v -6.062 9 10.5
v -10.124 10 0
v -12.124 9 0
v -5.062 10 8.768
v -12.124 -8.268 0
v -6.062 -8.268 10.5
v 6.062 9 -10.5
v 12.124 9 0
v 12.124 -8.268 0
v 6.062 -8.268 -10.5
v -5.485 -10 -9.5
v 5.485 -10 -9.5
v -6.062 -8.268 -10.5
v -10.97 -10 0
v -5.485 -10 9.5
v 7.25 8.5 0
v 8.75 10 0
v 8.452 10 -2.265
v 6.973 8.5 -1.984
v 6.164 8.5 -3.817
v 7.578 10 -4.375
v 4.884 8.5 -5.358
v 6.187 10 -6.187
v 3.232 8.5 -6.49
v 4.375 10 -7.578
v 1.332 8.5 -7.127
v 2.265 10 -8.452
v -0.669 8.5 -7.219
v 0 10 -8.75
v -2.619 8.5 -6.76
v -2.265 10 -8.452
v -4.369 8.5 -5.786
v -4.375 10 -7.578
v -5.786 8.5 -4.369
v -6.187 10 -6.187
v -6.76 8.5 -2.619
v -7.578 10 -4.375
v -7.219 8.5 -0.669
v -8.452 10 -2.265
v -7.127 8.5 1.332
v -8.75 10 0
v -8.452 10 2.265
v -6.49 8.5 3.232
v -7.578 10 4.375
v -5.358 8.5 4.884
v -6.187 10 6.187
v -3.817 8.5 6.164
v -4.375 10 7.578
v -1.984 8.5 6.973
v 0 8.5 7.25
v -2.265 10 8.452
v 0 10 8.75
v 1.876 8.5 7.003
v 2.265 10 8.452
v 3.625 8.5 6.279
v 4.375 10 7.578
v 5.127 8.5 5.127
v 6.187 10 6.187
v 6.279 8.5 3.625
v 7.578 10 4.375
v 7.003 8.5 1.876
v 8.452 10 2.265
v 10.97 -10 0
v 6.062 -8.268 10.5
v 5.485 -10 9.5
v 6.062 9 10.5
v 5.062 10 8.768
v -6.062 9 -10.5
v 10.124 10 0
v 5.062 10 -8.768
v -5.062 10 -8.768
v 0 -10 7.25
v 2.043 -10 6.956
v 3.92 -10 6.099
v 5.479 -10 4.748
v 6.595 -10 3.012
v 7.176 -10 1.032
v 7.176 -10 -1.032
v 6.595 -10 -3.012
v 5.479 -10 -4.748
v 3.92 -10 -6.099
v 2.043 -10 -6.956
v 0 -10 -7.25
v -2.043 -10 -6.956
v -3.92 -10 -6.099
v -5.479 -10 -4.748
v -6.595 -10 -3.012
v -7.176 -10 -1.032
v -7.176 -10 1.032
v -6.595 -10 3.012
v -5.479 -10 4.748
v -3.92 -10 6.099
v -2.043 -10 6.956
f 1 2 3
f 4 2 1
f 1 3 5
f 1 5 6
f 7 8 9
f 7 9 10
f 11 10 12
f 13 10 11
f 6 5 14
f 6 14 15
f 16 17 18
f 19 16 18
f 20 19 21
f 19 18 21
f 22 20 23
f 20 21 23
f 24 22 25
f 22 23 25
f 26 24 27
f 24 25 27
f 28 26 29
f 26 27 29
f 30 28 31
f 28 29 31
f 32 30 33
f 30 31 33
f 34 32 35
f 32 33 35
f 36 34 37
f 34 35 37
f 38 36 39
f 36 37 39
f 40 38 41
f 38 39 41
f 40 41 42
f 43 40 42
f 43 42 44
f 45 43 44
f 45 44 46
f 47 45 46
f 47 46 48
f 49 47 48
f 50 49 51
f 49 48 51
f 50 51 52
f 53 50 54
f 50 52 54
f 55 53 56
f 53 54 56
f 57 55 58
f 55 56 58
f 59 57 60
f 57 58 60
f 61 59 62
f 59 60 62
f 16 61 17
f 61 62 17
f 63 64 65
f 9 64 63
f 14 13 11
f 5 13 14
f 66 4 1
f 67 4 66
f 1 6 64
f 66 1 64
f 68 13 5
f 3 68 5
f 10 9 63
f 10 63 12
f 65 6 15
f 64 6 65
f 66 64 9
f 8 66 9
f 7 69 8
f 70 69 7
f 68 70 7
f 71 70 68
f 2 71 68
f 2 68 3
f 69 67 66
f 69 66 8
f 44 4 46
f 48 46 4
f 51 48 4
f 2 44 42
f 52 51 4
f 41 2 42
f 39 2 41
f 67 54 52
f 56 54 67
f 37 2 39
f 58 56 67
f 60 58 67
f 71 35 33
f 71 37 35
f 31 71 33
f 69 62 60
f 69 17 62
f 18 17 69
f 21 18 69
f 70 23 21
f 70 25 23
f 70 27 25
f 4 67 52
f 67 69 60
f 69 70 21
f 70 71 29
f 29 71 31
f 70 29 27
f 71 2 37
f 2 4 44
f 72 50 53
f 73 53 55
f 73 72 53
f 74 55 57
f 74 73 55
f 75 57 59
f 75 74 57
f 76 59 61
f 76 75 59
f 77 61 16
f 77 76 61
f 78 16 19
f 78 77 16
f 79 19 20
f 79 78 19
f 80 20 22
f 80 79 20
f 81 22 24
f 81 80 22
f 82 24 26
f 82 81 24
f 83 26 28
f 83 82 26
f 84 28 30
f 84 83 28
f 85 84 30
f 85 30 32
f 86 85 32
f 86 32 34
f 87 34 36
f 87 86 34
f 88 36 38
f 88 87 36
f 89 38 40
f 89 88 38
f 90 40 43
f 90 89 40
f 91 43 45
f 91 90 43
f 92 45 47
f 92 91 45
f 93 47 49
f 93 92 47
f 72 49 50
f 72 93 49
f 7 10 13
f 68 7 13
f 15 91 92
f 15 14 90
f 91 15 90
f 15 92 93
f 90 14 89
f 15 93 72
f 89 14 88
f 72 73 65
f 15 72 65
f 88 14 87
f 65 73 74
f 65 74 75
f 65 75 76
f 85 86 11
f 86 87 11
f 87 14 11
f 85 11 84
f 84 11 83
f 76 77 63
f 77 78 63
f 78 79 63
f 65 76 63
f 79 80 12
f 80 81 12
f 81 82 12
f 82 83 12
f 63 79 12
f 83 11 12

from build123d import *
from OCP.BRepFilletAPI import BRepFilletAPI_MakeChamfer

# Parameters (mm, degrees)
SKETCH1_R           = 7.25
BOSS_EXTRUDE1_DEPTH = 10
CHAMFER2_SIZE       = 1
CHAMFER2_SIZE2      = 1.732050808


with BuildPart() as part:
    # Sketch1 → Boss-Extrude1 (new, symmetric)
    with BuildSketch(Plane(origin=(0, 0, 0), x_dir=(1, 0, 0), z_dir=(0, 1, 0))):
        Polygon((-12.124355653, 0), (-6.062177826, -10.5), (6.062177826, -10.5), (12.124355653, 0), (6.062177826, 10.5), (-6.062177826, 10.5), align=None)
        with Locations(Location((0, 0, 0), (0, 0, 270))):
            Circle(SKETCH1_R, mode=Mode.SUBTRACT)
    extrude(amount=BOSS_EXTRUDE1_DEPTH, both=True)

    # Chamfer1: read off the stored shape, not the designer's step
    # Chamfer1 outline → Chamfer1 (revolve, cut)
    with BuildSketch(Plane.XY):
        Polygon((7.25, 10), (7.25, 8.5), (8.75, 10), align=None)
    revolve(axis=Axis((0, 0, 0), (0, 1, 0)), mode=Mode.SUBTRACT)

    # Chamfer2: one chamfer whose edges measure the first distance from different faces: ONE call of the kernel's chamfer builder (chamfer() names one face for all edges)
    chamfer2_edges_1 = [part.edges().sort_by_distance(p)[0] for p in [
        (0, 10, 10.5),
    ]]
    chamfer2_side_1 = [part.faces().sort_by_distance(p)[0] for p in [
        (0, 0, 10.5),
    ]]
    chamfer2_edges_2 = [part.edges().sort_by_distance(p)[0] for p in [
        (9.09326674, 10, 5.25),
    ]]
    chamfer2_side_2 = [part.faces().sort_by_distance(p)[0] for p in [
        (9.09326674, 0, 5.25),
    ]]
    chamfer2_edges_3 = [part.edges().sort_by_distance(p)[0] for p in [
        (9.09326674, 10, -5.25),
    ]]
    chamfer2_side_3 = [part.faces().sort_by_distance(p)[0] for p in [
        (9.09326674, 0, -5.25),
    ]]
    chamfer2_edges_4 = [part.edges().sort_by_distance(p)[0] for p in [
        (0, 10, -10.5),
    ]]
    chamfer2_side_4 = [part.faces().sort_by_distance(p)[0] for p in [
        (0, 0, -10.5),
    ]]
    chamfer2_edges_5 = [part.edges().sort_by_distance(p)[0] for p in [
        (-9.09326674, 10, -5.25),
    ]]
    chamfer2_side_5 = [part.faces().sort_by_distance(p)[0] for p in [
        (-9.09326674, 0, -5.25),
    ]]
    chamfer2_edges_6 = [part.edges().sort_by_distance(p)[0] for p in [
        (0, -10, -10.5),
        (9.09326674, -10, -5.25),
        (9.09326674, -10, 5.25),
        (0, -10, 10.5),
        (-9.09326674, -10, 5.25),
        (-9.09326674, -10, -5.25),
    ]]
    chamfer2_side_6 = [part.faces().sort_by_distance(p)[0] for p in [
        (-8.815462852, -10, 5.089609851),
    ]]
    chamfer2_edges_7 = [part.edges().sort_by_distance(p)[0] for p in [
        (-9.09326674, 10, 5.25),
    ]]
    chamfer2_side_7 = [part.faces().sort_by_distance(p)[0] for p in [
        (-9.09326674, 0, 5.25),
    ]]
    chamfer2 = BRepFilletAPI_MakeChamfer(part.part.solid().wrapped)
    for e in chamfer2_edges_1:
        chamfer2.Add(CHAMFER2_SIZE, CHAMFER2_SIZE2, e.wrapped, chamfer2_side_1[0].wrapped)  # the first distance lies on this face
    for e in chamfer2_edges_2:
        chamfer2.Add(CHAMFER2_SIZE, CHAMFER2_SIZE2, e.wrapped, chamfer2_side_2[0].wrapped)  # the first distance lies on this face
    for e in chamfer2_edges_3:
        chamfer2.Add(CHAMFER2_SIZE, CHAMFER2_SIZE2, e.wrapped, chamfer2_side_3[0].wrapped)  # the first distance lies on this face
    for e in chamfer2_edges_4:
        chamfer2.Add(CHAMFER2_SIZE, CHAMFER2_SIZE2, e.wrapped, chamfer2_side_4[0].wrapped)  # the first distance lies on this face
    for e in chamfer2_edges_5:
        chamfer2.Add(CHAMFER2_SIZE, CHAMFER2_SIZE2, e.wrapped, chamfer2_side_5[0].wrapped)  # the first distance lies on this face
    for e in chamfer2_edges_6:
        chamfer2.Add(CHAMFER2_SIZE, CHAMFER2_SIZE2, e.wrapped, chamfer2_side_6[0].wrapped)  # the first distance lies on this face
    for e in chamfer2_edges_7:
        chamfer2.Add(CHAMFER2_SIZE, CHAMFER2_SIZE2, e.wrapped, chamfer2_side_7[0].wrapped)  # the first distance lies on this face
    add(Compound.cast(chamfer2.Shape()), mode=Mode.REPLACE)


solid = part.part
